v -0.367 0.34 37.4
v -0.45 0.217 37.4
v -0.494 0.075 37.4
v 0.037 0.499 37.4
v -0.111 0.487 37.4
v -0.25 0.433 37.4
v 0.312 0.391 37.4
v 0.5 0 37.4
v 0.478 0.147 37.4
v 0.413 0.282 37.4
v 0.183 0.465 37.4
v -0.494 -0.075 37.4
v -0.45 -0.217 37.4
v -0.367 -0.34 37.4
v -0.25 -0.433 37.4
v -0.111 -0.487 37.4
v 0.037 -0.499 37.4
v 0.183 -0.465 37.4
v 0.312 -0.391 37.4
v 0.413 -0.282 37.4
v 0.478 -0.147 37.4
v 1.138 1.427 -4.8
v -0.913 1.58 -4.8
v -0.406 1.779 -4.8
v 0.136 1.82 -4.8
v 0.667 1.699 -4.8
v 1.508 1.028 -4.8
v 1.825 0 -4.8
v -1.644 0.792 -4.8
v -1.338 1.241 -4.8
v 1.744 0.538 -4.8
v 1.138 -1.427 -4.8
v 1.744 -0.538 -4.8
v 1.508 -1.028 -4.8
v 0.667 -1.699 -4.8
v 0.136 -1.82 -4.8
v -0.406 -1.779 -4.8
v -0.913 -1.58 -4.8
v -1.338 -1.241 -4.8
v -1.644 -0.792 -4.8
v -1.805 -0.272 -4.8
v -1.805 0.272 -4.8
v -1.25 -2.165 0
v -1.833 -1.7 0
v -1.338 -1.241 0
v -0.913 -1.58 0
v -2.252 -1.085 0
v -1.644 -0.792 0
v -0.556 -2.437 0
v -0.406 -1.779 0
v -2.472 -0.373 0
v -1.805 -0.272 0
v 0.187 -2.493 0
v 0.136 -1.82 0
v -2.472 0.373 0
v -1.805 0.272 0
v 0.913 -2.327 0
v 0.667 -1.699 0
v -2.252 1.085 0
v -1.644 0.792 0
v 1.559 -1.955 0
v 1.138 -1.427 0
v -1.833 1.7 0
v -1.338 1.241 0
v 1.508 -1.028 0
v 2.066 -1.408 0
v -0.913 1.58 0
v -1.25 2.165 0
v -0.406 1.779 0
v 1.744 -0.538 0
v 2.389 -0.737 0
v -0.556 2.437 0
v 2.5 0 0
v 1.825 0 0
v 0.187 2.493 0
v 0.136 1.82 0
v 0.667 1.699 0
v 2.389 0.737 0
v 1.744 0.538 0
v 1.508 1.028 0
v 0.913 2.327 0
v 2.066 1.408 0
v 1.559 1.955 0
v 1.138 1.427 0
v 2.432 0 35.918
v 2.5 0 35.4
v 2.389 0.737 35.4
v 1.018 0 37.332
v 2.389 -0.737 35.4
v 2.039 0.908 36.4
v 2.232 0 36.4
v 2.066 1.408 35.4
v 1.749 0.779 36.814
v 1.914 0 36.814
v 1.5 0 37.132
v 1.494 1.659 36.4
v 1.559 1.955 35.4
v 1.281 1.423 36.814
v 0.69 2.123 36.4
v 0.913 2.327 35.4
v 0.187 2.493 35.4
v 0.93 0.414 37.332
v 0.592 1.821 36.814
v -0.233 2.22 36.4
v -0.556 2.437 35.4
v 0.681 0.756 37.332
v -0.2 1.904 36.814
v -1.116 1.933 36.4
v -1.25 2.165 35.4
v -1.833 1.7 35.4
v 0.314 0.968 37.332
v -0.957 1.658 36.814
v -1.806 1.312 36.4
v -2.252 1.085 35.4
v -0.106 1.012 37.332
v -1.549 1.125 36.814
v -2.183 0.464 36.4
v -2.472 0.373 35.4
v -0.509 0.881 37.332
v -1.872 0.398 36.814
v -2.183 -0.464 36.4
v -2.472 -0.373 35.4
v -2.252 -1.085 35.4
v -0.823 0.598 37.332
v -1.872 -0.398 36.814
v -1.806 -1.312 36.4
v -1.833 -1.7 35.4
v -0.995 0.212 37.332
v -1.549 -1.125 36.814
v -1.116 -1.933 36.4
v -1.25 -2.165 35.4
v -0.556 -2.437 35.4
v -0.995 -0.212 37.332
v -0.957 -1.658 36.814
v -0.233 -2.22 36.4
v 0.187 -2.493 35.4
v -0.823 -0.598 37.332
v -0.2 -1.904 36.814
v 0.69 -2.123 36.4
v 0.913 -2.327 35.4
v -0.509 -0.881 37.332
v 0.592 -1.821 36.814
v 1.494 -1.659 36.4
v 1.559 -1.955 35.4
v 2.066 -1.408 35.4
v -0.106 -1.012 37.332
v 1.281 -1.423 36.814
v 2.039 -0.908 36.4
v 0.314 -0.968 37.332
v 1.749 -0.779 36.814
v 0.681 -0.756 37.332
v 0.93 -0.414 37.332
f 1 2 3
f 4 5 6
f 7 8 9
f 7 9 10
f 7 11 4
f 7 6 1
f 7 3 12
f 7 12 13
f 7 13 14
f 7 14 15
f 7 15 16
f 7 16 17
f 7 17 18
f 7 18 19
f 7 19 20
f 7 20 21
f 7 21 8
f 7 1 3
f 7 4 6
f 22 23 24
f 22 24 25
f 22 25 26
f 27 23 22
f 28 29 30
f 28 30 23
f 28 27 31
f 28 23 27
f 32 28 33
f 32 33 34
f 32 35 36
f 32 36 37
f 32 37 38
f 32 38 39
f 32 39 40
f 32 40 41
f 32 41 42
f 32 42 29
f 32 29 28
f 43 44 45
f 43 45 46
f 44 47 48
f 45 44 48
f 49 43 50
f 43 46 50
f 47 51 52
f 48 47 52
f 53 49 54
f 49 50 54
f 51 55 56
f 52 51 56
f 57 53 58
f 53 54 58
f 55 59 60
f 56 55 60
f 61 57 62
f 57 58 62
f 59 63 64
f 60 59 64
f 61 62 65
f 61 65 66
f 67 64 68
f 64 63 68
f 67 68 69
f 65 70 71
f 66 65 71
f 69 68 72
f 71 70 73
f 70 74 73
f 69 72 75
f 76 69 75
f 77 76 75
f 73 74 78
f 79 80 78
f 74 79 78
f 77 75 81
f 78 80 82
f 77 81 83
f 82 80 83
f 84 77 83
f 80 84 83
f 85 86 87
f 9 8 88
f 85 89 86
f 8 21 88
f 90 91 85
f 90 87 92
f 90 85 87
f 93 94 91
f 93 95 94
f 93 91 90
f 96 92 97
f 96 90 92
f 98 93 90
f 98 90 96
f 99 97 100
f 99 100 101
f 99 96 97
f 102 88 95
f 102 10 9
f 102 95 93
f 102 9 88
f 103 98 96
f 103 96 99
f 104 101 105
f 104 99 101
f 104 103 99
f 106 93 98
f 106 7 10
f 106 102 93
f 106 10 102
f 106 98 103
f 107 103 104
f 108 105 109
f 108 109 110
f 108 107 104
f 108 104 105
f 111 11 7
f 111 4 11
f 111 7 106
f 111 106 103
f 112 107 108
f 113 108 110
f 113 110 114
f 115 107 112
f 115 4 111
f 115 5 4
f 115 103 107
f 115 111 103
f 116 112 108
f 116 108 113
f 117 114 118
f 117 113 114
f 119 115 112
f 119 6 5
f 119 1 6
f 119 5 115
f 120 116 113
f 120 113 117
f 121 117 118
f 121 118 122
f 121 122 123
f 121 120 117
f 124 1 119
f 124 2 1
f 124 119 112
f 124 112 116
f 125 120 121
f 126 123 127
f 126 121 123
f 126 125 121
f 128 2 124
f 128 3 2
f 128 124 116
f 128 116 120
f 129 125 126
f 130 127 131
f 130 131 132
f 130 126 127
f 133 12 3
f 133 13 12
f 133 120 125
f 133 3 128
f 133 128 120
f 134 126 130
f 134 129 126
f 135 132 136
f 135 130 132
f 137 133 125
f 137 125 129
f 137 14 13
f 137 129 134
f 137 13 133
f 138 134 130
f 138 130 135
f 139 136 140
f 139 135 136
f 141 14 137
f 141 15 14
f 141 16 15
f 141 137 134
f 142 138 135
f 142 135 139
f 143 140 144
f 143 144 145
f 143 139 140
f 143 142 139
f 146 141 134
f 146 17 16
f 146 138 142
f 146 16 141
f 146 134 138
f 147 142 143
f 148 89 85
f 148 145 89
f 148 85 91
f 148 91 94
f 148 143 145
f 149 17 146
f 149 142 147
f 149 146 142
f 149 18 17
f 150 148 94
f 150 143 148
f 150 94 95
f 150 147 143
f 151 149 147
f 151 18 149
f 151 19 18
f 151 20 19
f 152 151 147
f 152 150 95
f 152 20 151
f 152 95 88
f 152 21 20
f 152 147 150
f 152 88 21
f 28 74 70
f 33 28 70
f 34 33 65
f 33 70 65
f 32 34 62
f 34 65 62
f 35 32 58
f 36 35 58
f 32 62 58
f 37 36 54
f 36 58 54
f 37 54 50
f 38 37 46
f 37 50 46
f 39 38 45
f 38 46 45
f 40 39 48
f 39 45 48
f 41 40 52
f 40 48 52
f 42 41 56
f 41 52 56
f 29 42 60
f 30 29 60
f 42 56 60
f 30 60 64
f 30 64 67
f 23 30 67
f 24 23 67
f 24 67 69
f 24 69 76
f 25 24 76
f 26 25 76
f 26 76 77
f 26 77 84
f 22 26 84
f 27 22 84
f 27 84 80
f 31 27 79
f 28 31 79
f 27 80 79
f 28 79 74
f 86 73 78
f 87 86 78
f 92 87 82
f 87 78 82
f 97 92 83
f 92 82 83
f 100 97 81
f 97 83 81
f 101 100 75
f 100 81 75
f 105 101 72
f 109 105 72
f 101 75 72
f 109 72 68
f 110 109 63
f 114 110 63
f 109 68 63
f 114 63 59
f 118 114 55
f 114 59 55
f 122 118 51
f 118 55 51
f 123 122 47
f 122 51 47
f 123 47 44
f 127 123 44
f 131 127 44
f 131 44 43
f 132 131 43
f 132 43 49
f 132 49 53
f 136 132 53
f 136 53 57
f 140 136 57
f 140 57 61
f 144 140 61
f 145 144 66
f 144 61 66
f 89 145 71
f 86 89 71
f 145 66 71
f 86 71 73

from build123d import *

# Parameters (mm, degrees)
F0_R     = 2.5
F1_DEPTH = 37.4
F2_R     = 2
F3_R     = 1.825
F4_DEPTH = 4.8


with BuildPart() as f1:
    # F0 (on Top) → F1 (new body)
    with BuildSketch(Plane.XY):
        Circle(F0_R)
    extrude(amount=F1_DEPTH)

    # F2
    f2_edges = [f1.edges().sort_by_distance(p)[0] for p in [
        (-2.5, 0, 37.4),
    ]]
    fillet(f2_edges, radius=F2_R)

    # F3 (on face) → F4 (join)
    with BuildSketch(Plane(origin=(0, 0, 0), x_dir=(1, 0, 0), z_dir=(0, 0, -1))):
        Circle(F3_R)
    extrude(amount=F4_DEPTH)


solid = f1.part
